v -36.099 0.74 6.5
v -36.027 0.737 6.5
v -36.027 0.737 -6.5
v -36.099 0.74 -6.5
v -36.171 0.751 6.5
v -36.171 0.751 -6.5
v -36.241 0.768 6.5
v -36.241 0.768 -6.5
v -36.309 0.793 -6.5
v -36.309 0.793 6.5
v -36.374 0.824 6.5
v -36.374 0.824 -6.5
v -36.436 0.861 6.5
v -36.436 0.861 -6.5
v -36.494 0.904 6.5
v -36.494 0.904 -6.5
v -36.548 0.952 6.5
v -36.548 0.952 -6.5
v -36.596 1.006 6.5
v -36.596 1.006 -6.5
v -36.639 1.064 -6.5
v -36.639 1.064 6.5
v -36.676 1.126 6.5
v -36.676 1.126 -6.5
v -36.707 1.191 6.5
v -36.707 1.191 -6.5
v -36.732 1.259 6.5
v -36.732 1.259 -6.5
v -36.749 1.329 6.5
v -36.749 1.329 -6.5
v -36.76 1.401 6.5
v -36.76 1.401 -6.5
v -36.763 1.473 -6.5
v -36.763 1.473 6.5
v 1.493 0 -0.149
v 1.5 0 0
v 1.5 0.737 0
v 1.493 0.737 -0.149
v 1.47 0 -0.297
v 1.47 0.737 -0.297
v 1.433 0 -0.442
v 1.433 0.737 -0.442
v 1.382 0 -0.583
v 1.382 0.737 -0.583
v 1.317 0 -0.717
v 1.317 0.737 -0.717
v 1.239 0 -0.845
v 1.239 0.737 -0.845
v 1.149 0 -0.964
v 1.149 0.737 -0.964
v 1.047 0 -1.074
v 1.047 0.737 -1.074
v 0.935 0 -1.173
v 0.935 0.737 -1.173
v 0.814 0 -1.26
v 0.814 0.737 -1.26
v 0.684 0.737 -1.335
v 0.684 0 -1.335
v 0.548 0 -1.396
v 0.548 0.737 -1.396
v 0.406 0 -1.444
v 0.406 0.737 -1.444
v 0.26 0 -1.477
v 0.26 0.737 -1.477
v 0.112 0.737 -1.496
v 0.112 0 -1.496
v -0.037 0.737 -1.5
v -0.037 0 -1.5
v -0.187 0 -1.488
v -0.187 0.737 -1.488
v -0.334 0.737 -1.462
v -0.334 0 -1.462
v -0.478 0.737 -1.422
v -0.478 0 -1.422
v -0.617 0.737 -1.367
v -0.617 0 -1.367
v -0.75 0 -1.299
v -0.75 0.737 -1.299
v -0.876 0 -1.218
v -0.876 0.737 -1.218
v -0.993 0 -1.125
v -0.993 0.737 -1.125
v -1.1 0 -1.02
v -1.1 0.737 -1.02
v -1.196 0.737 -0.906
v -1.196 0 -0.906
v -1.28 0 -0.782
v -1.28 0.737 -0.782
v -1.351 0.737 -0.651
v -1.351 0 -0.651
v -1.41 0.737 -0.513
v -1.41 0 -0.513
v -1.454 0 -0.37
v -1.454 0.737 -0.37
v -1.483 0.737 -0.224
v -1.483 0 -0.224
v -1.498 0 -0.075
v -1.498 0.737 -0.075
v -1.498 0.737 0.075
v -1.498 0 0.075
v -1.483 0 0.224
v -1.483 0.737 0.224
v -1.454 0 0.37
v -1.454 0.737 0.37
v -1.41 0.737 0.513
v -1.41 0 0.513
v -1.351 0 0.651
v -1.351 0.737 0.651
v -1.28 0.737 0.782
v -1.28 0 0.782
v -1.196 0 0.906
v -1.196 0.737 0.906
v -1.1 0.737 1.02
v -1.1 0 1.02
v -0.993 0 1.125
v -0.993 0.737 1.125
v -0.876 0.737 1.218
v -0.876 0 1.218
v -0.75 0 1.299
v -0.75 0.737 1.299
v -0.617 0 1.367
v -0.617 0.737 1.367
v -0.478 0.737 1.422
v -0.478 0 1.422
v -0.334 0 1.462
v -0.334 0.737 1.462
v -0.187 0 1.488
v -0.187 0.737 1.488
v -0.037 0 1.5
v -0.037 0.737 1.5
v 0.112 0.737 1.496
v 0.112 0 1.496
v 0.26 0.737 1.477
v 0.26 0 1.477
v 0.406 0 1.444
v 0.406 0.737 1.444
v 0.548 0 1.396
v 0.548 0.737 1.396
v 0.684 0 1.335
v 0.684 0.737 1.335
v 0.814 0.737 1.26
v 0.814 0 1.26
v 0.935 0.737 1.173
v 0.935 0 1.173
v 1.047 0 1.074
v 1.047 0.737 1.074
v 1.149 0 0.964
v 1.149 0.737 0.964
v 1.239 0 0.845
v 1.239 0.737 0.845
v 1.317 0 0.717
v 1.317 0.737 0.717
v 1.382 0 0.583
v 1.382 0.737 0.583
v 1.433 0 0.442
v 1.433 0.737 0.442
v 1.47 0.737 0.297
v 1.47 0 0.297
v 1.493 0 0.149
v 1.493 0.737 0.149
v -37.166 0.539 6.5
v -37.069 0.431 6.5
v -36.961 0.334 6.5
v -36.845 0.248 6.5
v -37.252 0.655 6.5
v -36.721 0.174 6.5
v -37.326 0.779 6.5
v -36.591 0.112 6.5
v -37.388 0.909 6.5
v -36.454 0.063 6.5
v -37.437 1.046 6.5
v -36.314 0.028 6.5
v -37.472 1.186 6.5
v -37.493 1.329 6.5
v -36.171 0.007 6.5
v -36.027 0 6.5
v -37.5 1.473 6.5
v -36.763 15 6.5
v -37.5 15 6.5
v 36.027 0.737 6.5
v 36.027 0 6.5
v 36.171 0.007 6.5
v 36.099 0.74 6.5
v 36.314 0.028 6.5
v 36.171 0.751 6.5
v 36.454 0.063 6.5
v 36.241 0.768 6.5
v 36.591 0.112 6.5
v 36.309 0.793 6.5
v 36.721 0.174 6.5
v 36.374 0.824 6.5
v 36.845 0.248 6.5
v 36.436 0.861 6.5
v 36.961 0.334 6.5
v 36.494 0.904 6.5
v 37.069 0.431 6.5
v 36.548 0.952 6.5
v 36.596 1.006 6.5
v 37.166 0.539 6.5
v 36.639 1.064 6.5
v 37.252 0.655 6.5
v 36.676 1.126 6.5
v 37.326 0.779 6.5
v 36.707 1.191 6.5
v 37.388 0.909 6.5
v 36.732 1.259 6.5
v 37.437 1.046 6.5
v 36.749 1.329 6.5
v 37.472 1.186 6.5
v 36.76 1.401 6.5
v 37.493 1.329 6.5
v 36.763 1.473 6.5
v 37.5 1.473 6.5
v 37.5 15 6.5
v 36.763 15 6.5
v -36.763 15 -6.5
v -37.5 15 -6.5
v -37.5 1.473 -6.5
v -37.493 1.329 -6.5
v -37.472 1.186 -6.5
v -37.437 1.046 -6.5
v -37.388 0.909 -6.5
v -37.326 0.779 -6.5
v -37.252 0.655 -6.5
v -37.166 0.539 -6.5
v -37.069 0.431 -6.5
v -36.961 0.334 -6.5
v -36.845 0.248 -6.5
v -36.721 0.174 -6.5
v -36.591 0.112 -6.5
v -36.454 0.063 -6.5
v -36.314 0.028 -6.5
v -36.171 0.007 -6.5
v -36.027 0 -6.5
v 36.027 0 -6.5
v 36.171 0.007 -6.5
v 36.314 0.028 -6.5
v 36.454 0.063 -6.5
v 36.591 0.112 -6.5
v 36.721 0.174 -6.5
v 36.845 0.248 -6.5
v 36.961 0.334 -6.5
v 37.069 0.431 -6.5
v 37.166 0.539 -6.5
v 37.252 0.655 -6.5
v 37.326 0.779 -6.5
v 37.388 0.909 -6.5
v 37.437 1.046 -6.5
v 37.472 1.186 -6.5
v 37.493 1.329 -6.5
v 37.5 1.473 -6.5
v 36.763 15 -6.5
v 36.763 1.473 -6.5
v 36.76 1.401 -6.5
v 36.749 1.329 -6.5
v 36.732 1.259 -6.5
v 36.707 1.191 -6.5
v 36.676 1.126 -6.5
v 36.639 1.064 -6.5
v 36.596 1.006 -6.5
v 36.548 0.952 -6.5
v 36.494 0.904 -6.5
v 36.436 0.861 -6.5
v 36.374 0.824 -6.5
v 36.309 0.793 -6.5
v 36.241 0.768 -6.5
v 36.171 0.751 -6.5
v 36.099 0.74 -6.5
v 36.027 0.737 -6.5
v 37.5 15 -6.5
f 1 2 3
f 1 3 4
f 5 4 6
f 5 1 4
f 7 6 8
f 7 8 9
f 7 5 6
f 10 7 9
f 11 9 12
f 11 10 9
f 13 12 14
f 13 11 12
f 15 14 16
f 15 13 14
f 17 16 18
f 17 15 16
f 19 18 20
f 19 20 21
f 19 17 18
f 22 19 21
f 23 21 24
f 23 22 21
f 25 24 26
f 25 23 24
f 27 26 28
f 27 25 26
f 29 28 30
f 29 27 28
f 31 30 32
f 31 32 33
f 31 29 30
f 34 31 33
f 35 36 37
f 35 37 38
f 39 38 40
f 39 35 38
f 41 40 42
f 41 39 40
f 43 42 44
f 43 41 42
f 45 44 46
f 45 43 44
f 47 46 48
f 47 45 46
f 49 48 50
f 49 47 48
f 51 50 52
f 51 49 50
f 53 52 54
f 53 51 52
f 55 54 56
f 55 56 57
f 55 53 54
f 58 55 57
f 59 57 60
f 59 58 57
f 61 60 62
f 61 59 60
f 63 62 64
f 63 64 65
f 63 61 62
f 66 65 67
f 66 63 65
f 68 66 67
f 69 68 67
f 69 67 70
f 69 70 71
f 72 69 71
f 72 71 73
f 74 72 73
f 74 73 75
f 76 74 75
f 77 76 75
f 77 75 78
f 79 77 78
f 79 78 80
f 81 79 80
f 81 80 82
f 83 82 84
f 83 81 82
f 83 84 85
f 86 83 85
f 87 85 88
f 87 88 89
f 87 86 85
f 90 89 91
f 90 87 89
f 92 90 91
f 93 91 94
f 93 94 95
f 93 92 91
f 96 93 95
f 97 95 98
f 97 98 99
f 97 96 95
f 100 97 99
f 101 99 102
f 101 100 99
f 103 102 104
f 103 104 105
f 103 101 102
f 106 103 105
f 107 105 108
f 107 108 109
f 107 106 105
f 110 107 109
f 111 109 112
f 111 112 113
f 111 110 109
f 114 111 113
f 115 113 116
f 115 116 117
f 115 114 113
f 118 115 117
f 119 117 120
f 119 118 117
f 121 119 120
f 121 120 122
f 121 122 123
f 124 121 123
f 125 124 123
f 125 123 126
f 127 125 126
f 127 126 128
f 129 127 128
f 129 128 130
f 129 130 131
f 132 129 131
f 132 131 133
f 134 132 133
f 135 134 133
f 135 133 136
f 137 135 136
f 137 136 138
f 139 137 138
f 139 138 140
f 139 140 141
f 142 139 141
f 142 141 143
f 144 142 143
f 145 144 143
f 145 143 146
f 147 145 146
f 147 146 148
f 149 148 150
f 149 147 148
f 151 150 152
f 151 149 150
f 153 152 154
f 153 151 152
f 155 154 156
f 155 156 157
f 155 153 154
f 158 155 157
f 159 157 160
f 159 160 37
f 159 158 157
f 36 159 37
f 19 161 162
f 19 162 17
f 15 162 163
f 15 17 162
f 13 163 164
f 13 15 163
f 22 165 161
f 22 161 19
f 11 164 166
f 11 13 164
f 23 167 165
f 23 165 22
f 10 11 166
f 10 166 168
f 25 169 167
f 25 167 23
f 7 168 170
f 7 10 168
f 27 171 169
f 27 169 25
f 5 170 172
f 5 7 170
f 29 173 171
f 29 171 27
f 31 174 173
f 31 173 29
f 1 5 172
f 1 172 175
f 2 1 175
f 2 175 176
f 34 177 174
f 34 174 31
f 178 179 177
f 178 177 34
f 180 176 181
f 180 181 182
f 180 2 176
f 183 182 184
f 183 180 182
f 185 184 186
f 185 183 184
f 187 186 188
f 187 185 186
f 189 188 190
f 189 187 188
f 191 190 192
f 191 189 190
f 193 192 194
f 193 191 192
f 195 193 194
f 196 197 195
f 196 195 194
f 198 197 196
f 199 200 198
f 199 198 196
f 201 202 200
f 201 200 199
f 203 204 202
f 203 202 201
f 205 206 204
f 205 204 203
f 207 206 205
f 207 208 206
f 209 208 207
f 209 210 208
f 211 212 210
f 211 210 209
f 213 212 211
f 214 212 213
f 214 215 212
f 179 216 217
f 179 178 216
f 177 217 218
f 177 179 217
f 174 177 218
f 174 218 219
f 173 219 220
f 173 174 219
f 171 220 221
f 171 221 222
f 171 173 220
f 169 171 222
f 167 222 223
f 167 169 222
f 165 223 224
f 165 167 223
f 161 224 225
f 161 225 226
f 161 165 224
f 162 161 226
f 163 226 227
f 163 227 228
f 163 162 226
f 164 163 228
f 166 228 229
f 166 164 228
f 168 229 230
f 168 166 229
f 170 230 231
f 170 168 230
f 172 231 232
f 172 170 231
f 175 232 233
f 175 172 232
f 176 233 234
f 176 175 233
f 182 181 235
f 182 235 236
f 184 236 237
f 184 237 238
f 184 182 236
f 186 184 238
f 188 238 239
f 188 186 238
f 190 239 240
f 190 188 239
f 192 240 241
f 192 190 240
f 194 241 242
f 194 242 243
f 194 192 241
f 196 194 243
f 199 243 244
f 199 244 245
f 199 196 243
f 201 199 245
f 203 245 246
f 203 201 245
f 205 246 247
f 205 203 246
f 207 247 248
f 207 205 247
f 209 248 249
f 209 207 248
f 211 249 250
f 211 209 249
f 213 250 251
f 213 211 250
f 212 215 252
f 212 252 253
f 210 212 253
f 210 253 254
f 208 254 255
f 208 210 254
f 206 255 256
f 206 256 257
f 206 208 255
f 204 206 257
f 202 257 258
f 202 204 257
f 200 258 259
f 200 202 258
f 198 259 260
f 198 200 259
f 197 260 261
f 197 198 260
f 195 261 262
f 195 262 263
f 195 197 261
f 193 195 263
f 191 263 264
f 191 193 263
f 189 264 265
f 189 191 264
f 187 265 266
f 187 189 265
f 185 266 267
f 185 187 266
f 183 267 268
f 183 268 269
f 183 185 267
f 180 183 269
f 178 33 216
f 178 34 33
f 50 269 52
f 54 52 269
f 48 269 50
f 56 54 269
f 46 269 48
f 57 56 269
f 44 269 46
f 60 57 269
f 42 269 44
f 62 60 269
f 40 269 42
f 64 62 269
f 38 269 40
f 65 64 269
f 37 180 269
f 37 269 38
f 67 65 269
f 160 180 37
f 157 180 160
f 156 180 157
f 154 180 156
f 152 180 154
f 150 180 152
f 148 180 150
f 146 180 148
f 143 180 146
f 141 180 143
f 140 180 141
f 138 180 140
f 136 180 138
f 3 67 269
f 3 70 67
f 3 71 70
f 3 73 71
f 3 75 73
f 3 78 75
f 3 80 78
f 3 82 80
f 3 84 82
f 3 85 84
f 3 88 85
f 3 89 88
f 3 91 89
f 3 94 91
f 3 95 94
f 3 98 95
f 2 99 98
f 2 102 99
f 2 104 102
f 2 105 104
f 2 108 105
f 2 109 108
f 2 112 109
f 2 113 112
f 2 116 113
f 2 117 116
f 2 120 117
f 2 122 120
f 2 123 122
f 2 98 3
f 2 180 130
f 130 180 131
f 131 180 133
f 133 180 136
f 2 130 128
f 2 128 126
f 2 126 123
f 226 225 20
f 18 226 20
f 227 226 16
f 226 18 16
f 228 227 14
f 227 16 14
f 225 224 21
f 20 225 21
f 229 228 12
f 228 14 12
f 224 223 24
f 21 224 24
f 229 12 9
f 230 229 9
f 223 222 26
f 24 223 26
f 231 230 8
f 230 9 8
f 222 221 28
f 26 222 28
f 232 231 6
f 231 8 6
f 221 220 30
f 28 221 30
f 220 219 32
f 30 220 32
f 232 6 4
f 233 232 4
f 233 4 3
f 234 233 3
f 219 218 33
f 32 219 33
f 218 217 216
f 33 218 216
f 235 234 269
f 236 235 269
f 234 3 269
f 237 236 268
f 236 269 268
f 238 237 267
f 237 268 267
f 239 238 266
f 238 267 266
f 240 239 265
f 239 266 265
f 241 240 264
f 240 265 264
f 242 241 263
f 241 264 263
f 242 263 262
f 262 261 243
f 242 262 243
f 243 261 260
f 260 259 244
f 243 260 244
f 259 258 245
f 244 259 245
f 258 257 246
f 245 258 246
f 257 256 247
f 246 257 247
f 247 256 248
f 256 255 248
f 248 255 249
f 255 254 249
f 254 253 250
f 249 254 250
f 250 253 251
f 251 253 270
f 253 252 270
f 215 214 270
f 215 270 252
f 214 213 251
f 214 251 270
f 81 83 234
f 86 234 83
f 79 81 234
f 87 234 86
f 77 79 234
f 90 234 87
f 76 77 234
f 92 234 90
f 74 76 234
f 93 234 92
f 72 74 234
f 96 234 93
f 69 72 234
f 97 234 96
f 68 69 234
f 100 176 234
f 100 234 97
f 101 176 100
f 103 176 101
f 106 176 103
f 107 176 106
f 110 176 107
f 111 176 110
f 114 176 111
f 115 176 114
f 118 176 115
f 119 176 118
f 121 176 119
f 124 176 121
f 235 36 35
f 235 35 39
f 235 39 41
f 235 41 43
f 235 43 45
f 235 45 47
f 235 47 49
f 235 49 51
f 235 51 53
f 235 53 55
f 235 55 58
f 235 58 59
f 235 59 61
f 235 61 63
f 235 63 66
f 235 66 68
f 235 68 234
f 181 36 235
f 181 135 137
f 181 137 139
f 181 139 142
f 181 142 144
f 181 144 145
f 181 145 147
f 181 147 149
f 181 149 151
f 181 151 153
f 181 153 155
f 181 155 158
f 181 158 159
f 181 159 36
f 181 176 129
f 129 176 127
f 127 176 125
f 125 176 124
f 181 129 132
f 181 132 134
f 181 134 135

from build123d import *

# Parameters (mm, degrees)
SM_BASE_FLANGE_1_DEPTH = 6.5
OTHER_1_OUTLINE_R      = 1.5
OTHER_1_DEPTH          = 0.7366


# Read off the part's stored shape, not the designer's step: Отверстие1
# Sheet-metal steps are written as plain solids
with BuildPart() as part:
    # Sketch 1 → Базовая кромка1 (new, symmetric)
    with BuildSketch(Plane.XY):
        with BuildLine():
            Line((-37.5, 15), (-37.5, 1.4732))
            ThreePointArc((-37.5, 1.4732), (-37.06850971, 0.43149029), (-36.0268, 0))
            Line((-36.0268, 0), (36.0268, 0))
            ThreePointArc((36.0268, 0), (37.06850971, 0.43149029), (37.5, 1.4732))
            Line((37.5, 1.4732), (37.5, 15))
            Line((37.5, 15), (36.7634, 15))
            Line((36.7634, 15), (36.7634, 1.4732))
            ThreePointArc((36.7634, 1.4732), (36.547654855, 0.952345145), (36.0268, 0.7366))
            Line((36.0268, 0.7366), (-36.0268, 0.7366))
            ThreePointArc((-36.0268, 0.7366), (-36.547654855, 0.952345145), (-36.7634, 1.4732))
            Line((-36.7634, 1.4732), (-36.7634, 15))
            Line((-36.7634, 15), (-37.5, 15))
        make_face()
    extrude(amount=SM_BASE_FLANGE_1_DEPTH, both=True)

    # Отверстие1 outline → Отверстие1 (cut)
    with BuildSketch(Plane(origin=(0, 0, 0), x_dir=(1, 0, 0), z_dir=(0, 1, 0))):
        Circle(OTHER_1_OUTLINE_R)
    extrude(amount=OTHER_1_DEPTH, mode=Mode.SUBTRACT)


solid = part.part
